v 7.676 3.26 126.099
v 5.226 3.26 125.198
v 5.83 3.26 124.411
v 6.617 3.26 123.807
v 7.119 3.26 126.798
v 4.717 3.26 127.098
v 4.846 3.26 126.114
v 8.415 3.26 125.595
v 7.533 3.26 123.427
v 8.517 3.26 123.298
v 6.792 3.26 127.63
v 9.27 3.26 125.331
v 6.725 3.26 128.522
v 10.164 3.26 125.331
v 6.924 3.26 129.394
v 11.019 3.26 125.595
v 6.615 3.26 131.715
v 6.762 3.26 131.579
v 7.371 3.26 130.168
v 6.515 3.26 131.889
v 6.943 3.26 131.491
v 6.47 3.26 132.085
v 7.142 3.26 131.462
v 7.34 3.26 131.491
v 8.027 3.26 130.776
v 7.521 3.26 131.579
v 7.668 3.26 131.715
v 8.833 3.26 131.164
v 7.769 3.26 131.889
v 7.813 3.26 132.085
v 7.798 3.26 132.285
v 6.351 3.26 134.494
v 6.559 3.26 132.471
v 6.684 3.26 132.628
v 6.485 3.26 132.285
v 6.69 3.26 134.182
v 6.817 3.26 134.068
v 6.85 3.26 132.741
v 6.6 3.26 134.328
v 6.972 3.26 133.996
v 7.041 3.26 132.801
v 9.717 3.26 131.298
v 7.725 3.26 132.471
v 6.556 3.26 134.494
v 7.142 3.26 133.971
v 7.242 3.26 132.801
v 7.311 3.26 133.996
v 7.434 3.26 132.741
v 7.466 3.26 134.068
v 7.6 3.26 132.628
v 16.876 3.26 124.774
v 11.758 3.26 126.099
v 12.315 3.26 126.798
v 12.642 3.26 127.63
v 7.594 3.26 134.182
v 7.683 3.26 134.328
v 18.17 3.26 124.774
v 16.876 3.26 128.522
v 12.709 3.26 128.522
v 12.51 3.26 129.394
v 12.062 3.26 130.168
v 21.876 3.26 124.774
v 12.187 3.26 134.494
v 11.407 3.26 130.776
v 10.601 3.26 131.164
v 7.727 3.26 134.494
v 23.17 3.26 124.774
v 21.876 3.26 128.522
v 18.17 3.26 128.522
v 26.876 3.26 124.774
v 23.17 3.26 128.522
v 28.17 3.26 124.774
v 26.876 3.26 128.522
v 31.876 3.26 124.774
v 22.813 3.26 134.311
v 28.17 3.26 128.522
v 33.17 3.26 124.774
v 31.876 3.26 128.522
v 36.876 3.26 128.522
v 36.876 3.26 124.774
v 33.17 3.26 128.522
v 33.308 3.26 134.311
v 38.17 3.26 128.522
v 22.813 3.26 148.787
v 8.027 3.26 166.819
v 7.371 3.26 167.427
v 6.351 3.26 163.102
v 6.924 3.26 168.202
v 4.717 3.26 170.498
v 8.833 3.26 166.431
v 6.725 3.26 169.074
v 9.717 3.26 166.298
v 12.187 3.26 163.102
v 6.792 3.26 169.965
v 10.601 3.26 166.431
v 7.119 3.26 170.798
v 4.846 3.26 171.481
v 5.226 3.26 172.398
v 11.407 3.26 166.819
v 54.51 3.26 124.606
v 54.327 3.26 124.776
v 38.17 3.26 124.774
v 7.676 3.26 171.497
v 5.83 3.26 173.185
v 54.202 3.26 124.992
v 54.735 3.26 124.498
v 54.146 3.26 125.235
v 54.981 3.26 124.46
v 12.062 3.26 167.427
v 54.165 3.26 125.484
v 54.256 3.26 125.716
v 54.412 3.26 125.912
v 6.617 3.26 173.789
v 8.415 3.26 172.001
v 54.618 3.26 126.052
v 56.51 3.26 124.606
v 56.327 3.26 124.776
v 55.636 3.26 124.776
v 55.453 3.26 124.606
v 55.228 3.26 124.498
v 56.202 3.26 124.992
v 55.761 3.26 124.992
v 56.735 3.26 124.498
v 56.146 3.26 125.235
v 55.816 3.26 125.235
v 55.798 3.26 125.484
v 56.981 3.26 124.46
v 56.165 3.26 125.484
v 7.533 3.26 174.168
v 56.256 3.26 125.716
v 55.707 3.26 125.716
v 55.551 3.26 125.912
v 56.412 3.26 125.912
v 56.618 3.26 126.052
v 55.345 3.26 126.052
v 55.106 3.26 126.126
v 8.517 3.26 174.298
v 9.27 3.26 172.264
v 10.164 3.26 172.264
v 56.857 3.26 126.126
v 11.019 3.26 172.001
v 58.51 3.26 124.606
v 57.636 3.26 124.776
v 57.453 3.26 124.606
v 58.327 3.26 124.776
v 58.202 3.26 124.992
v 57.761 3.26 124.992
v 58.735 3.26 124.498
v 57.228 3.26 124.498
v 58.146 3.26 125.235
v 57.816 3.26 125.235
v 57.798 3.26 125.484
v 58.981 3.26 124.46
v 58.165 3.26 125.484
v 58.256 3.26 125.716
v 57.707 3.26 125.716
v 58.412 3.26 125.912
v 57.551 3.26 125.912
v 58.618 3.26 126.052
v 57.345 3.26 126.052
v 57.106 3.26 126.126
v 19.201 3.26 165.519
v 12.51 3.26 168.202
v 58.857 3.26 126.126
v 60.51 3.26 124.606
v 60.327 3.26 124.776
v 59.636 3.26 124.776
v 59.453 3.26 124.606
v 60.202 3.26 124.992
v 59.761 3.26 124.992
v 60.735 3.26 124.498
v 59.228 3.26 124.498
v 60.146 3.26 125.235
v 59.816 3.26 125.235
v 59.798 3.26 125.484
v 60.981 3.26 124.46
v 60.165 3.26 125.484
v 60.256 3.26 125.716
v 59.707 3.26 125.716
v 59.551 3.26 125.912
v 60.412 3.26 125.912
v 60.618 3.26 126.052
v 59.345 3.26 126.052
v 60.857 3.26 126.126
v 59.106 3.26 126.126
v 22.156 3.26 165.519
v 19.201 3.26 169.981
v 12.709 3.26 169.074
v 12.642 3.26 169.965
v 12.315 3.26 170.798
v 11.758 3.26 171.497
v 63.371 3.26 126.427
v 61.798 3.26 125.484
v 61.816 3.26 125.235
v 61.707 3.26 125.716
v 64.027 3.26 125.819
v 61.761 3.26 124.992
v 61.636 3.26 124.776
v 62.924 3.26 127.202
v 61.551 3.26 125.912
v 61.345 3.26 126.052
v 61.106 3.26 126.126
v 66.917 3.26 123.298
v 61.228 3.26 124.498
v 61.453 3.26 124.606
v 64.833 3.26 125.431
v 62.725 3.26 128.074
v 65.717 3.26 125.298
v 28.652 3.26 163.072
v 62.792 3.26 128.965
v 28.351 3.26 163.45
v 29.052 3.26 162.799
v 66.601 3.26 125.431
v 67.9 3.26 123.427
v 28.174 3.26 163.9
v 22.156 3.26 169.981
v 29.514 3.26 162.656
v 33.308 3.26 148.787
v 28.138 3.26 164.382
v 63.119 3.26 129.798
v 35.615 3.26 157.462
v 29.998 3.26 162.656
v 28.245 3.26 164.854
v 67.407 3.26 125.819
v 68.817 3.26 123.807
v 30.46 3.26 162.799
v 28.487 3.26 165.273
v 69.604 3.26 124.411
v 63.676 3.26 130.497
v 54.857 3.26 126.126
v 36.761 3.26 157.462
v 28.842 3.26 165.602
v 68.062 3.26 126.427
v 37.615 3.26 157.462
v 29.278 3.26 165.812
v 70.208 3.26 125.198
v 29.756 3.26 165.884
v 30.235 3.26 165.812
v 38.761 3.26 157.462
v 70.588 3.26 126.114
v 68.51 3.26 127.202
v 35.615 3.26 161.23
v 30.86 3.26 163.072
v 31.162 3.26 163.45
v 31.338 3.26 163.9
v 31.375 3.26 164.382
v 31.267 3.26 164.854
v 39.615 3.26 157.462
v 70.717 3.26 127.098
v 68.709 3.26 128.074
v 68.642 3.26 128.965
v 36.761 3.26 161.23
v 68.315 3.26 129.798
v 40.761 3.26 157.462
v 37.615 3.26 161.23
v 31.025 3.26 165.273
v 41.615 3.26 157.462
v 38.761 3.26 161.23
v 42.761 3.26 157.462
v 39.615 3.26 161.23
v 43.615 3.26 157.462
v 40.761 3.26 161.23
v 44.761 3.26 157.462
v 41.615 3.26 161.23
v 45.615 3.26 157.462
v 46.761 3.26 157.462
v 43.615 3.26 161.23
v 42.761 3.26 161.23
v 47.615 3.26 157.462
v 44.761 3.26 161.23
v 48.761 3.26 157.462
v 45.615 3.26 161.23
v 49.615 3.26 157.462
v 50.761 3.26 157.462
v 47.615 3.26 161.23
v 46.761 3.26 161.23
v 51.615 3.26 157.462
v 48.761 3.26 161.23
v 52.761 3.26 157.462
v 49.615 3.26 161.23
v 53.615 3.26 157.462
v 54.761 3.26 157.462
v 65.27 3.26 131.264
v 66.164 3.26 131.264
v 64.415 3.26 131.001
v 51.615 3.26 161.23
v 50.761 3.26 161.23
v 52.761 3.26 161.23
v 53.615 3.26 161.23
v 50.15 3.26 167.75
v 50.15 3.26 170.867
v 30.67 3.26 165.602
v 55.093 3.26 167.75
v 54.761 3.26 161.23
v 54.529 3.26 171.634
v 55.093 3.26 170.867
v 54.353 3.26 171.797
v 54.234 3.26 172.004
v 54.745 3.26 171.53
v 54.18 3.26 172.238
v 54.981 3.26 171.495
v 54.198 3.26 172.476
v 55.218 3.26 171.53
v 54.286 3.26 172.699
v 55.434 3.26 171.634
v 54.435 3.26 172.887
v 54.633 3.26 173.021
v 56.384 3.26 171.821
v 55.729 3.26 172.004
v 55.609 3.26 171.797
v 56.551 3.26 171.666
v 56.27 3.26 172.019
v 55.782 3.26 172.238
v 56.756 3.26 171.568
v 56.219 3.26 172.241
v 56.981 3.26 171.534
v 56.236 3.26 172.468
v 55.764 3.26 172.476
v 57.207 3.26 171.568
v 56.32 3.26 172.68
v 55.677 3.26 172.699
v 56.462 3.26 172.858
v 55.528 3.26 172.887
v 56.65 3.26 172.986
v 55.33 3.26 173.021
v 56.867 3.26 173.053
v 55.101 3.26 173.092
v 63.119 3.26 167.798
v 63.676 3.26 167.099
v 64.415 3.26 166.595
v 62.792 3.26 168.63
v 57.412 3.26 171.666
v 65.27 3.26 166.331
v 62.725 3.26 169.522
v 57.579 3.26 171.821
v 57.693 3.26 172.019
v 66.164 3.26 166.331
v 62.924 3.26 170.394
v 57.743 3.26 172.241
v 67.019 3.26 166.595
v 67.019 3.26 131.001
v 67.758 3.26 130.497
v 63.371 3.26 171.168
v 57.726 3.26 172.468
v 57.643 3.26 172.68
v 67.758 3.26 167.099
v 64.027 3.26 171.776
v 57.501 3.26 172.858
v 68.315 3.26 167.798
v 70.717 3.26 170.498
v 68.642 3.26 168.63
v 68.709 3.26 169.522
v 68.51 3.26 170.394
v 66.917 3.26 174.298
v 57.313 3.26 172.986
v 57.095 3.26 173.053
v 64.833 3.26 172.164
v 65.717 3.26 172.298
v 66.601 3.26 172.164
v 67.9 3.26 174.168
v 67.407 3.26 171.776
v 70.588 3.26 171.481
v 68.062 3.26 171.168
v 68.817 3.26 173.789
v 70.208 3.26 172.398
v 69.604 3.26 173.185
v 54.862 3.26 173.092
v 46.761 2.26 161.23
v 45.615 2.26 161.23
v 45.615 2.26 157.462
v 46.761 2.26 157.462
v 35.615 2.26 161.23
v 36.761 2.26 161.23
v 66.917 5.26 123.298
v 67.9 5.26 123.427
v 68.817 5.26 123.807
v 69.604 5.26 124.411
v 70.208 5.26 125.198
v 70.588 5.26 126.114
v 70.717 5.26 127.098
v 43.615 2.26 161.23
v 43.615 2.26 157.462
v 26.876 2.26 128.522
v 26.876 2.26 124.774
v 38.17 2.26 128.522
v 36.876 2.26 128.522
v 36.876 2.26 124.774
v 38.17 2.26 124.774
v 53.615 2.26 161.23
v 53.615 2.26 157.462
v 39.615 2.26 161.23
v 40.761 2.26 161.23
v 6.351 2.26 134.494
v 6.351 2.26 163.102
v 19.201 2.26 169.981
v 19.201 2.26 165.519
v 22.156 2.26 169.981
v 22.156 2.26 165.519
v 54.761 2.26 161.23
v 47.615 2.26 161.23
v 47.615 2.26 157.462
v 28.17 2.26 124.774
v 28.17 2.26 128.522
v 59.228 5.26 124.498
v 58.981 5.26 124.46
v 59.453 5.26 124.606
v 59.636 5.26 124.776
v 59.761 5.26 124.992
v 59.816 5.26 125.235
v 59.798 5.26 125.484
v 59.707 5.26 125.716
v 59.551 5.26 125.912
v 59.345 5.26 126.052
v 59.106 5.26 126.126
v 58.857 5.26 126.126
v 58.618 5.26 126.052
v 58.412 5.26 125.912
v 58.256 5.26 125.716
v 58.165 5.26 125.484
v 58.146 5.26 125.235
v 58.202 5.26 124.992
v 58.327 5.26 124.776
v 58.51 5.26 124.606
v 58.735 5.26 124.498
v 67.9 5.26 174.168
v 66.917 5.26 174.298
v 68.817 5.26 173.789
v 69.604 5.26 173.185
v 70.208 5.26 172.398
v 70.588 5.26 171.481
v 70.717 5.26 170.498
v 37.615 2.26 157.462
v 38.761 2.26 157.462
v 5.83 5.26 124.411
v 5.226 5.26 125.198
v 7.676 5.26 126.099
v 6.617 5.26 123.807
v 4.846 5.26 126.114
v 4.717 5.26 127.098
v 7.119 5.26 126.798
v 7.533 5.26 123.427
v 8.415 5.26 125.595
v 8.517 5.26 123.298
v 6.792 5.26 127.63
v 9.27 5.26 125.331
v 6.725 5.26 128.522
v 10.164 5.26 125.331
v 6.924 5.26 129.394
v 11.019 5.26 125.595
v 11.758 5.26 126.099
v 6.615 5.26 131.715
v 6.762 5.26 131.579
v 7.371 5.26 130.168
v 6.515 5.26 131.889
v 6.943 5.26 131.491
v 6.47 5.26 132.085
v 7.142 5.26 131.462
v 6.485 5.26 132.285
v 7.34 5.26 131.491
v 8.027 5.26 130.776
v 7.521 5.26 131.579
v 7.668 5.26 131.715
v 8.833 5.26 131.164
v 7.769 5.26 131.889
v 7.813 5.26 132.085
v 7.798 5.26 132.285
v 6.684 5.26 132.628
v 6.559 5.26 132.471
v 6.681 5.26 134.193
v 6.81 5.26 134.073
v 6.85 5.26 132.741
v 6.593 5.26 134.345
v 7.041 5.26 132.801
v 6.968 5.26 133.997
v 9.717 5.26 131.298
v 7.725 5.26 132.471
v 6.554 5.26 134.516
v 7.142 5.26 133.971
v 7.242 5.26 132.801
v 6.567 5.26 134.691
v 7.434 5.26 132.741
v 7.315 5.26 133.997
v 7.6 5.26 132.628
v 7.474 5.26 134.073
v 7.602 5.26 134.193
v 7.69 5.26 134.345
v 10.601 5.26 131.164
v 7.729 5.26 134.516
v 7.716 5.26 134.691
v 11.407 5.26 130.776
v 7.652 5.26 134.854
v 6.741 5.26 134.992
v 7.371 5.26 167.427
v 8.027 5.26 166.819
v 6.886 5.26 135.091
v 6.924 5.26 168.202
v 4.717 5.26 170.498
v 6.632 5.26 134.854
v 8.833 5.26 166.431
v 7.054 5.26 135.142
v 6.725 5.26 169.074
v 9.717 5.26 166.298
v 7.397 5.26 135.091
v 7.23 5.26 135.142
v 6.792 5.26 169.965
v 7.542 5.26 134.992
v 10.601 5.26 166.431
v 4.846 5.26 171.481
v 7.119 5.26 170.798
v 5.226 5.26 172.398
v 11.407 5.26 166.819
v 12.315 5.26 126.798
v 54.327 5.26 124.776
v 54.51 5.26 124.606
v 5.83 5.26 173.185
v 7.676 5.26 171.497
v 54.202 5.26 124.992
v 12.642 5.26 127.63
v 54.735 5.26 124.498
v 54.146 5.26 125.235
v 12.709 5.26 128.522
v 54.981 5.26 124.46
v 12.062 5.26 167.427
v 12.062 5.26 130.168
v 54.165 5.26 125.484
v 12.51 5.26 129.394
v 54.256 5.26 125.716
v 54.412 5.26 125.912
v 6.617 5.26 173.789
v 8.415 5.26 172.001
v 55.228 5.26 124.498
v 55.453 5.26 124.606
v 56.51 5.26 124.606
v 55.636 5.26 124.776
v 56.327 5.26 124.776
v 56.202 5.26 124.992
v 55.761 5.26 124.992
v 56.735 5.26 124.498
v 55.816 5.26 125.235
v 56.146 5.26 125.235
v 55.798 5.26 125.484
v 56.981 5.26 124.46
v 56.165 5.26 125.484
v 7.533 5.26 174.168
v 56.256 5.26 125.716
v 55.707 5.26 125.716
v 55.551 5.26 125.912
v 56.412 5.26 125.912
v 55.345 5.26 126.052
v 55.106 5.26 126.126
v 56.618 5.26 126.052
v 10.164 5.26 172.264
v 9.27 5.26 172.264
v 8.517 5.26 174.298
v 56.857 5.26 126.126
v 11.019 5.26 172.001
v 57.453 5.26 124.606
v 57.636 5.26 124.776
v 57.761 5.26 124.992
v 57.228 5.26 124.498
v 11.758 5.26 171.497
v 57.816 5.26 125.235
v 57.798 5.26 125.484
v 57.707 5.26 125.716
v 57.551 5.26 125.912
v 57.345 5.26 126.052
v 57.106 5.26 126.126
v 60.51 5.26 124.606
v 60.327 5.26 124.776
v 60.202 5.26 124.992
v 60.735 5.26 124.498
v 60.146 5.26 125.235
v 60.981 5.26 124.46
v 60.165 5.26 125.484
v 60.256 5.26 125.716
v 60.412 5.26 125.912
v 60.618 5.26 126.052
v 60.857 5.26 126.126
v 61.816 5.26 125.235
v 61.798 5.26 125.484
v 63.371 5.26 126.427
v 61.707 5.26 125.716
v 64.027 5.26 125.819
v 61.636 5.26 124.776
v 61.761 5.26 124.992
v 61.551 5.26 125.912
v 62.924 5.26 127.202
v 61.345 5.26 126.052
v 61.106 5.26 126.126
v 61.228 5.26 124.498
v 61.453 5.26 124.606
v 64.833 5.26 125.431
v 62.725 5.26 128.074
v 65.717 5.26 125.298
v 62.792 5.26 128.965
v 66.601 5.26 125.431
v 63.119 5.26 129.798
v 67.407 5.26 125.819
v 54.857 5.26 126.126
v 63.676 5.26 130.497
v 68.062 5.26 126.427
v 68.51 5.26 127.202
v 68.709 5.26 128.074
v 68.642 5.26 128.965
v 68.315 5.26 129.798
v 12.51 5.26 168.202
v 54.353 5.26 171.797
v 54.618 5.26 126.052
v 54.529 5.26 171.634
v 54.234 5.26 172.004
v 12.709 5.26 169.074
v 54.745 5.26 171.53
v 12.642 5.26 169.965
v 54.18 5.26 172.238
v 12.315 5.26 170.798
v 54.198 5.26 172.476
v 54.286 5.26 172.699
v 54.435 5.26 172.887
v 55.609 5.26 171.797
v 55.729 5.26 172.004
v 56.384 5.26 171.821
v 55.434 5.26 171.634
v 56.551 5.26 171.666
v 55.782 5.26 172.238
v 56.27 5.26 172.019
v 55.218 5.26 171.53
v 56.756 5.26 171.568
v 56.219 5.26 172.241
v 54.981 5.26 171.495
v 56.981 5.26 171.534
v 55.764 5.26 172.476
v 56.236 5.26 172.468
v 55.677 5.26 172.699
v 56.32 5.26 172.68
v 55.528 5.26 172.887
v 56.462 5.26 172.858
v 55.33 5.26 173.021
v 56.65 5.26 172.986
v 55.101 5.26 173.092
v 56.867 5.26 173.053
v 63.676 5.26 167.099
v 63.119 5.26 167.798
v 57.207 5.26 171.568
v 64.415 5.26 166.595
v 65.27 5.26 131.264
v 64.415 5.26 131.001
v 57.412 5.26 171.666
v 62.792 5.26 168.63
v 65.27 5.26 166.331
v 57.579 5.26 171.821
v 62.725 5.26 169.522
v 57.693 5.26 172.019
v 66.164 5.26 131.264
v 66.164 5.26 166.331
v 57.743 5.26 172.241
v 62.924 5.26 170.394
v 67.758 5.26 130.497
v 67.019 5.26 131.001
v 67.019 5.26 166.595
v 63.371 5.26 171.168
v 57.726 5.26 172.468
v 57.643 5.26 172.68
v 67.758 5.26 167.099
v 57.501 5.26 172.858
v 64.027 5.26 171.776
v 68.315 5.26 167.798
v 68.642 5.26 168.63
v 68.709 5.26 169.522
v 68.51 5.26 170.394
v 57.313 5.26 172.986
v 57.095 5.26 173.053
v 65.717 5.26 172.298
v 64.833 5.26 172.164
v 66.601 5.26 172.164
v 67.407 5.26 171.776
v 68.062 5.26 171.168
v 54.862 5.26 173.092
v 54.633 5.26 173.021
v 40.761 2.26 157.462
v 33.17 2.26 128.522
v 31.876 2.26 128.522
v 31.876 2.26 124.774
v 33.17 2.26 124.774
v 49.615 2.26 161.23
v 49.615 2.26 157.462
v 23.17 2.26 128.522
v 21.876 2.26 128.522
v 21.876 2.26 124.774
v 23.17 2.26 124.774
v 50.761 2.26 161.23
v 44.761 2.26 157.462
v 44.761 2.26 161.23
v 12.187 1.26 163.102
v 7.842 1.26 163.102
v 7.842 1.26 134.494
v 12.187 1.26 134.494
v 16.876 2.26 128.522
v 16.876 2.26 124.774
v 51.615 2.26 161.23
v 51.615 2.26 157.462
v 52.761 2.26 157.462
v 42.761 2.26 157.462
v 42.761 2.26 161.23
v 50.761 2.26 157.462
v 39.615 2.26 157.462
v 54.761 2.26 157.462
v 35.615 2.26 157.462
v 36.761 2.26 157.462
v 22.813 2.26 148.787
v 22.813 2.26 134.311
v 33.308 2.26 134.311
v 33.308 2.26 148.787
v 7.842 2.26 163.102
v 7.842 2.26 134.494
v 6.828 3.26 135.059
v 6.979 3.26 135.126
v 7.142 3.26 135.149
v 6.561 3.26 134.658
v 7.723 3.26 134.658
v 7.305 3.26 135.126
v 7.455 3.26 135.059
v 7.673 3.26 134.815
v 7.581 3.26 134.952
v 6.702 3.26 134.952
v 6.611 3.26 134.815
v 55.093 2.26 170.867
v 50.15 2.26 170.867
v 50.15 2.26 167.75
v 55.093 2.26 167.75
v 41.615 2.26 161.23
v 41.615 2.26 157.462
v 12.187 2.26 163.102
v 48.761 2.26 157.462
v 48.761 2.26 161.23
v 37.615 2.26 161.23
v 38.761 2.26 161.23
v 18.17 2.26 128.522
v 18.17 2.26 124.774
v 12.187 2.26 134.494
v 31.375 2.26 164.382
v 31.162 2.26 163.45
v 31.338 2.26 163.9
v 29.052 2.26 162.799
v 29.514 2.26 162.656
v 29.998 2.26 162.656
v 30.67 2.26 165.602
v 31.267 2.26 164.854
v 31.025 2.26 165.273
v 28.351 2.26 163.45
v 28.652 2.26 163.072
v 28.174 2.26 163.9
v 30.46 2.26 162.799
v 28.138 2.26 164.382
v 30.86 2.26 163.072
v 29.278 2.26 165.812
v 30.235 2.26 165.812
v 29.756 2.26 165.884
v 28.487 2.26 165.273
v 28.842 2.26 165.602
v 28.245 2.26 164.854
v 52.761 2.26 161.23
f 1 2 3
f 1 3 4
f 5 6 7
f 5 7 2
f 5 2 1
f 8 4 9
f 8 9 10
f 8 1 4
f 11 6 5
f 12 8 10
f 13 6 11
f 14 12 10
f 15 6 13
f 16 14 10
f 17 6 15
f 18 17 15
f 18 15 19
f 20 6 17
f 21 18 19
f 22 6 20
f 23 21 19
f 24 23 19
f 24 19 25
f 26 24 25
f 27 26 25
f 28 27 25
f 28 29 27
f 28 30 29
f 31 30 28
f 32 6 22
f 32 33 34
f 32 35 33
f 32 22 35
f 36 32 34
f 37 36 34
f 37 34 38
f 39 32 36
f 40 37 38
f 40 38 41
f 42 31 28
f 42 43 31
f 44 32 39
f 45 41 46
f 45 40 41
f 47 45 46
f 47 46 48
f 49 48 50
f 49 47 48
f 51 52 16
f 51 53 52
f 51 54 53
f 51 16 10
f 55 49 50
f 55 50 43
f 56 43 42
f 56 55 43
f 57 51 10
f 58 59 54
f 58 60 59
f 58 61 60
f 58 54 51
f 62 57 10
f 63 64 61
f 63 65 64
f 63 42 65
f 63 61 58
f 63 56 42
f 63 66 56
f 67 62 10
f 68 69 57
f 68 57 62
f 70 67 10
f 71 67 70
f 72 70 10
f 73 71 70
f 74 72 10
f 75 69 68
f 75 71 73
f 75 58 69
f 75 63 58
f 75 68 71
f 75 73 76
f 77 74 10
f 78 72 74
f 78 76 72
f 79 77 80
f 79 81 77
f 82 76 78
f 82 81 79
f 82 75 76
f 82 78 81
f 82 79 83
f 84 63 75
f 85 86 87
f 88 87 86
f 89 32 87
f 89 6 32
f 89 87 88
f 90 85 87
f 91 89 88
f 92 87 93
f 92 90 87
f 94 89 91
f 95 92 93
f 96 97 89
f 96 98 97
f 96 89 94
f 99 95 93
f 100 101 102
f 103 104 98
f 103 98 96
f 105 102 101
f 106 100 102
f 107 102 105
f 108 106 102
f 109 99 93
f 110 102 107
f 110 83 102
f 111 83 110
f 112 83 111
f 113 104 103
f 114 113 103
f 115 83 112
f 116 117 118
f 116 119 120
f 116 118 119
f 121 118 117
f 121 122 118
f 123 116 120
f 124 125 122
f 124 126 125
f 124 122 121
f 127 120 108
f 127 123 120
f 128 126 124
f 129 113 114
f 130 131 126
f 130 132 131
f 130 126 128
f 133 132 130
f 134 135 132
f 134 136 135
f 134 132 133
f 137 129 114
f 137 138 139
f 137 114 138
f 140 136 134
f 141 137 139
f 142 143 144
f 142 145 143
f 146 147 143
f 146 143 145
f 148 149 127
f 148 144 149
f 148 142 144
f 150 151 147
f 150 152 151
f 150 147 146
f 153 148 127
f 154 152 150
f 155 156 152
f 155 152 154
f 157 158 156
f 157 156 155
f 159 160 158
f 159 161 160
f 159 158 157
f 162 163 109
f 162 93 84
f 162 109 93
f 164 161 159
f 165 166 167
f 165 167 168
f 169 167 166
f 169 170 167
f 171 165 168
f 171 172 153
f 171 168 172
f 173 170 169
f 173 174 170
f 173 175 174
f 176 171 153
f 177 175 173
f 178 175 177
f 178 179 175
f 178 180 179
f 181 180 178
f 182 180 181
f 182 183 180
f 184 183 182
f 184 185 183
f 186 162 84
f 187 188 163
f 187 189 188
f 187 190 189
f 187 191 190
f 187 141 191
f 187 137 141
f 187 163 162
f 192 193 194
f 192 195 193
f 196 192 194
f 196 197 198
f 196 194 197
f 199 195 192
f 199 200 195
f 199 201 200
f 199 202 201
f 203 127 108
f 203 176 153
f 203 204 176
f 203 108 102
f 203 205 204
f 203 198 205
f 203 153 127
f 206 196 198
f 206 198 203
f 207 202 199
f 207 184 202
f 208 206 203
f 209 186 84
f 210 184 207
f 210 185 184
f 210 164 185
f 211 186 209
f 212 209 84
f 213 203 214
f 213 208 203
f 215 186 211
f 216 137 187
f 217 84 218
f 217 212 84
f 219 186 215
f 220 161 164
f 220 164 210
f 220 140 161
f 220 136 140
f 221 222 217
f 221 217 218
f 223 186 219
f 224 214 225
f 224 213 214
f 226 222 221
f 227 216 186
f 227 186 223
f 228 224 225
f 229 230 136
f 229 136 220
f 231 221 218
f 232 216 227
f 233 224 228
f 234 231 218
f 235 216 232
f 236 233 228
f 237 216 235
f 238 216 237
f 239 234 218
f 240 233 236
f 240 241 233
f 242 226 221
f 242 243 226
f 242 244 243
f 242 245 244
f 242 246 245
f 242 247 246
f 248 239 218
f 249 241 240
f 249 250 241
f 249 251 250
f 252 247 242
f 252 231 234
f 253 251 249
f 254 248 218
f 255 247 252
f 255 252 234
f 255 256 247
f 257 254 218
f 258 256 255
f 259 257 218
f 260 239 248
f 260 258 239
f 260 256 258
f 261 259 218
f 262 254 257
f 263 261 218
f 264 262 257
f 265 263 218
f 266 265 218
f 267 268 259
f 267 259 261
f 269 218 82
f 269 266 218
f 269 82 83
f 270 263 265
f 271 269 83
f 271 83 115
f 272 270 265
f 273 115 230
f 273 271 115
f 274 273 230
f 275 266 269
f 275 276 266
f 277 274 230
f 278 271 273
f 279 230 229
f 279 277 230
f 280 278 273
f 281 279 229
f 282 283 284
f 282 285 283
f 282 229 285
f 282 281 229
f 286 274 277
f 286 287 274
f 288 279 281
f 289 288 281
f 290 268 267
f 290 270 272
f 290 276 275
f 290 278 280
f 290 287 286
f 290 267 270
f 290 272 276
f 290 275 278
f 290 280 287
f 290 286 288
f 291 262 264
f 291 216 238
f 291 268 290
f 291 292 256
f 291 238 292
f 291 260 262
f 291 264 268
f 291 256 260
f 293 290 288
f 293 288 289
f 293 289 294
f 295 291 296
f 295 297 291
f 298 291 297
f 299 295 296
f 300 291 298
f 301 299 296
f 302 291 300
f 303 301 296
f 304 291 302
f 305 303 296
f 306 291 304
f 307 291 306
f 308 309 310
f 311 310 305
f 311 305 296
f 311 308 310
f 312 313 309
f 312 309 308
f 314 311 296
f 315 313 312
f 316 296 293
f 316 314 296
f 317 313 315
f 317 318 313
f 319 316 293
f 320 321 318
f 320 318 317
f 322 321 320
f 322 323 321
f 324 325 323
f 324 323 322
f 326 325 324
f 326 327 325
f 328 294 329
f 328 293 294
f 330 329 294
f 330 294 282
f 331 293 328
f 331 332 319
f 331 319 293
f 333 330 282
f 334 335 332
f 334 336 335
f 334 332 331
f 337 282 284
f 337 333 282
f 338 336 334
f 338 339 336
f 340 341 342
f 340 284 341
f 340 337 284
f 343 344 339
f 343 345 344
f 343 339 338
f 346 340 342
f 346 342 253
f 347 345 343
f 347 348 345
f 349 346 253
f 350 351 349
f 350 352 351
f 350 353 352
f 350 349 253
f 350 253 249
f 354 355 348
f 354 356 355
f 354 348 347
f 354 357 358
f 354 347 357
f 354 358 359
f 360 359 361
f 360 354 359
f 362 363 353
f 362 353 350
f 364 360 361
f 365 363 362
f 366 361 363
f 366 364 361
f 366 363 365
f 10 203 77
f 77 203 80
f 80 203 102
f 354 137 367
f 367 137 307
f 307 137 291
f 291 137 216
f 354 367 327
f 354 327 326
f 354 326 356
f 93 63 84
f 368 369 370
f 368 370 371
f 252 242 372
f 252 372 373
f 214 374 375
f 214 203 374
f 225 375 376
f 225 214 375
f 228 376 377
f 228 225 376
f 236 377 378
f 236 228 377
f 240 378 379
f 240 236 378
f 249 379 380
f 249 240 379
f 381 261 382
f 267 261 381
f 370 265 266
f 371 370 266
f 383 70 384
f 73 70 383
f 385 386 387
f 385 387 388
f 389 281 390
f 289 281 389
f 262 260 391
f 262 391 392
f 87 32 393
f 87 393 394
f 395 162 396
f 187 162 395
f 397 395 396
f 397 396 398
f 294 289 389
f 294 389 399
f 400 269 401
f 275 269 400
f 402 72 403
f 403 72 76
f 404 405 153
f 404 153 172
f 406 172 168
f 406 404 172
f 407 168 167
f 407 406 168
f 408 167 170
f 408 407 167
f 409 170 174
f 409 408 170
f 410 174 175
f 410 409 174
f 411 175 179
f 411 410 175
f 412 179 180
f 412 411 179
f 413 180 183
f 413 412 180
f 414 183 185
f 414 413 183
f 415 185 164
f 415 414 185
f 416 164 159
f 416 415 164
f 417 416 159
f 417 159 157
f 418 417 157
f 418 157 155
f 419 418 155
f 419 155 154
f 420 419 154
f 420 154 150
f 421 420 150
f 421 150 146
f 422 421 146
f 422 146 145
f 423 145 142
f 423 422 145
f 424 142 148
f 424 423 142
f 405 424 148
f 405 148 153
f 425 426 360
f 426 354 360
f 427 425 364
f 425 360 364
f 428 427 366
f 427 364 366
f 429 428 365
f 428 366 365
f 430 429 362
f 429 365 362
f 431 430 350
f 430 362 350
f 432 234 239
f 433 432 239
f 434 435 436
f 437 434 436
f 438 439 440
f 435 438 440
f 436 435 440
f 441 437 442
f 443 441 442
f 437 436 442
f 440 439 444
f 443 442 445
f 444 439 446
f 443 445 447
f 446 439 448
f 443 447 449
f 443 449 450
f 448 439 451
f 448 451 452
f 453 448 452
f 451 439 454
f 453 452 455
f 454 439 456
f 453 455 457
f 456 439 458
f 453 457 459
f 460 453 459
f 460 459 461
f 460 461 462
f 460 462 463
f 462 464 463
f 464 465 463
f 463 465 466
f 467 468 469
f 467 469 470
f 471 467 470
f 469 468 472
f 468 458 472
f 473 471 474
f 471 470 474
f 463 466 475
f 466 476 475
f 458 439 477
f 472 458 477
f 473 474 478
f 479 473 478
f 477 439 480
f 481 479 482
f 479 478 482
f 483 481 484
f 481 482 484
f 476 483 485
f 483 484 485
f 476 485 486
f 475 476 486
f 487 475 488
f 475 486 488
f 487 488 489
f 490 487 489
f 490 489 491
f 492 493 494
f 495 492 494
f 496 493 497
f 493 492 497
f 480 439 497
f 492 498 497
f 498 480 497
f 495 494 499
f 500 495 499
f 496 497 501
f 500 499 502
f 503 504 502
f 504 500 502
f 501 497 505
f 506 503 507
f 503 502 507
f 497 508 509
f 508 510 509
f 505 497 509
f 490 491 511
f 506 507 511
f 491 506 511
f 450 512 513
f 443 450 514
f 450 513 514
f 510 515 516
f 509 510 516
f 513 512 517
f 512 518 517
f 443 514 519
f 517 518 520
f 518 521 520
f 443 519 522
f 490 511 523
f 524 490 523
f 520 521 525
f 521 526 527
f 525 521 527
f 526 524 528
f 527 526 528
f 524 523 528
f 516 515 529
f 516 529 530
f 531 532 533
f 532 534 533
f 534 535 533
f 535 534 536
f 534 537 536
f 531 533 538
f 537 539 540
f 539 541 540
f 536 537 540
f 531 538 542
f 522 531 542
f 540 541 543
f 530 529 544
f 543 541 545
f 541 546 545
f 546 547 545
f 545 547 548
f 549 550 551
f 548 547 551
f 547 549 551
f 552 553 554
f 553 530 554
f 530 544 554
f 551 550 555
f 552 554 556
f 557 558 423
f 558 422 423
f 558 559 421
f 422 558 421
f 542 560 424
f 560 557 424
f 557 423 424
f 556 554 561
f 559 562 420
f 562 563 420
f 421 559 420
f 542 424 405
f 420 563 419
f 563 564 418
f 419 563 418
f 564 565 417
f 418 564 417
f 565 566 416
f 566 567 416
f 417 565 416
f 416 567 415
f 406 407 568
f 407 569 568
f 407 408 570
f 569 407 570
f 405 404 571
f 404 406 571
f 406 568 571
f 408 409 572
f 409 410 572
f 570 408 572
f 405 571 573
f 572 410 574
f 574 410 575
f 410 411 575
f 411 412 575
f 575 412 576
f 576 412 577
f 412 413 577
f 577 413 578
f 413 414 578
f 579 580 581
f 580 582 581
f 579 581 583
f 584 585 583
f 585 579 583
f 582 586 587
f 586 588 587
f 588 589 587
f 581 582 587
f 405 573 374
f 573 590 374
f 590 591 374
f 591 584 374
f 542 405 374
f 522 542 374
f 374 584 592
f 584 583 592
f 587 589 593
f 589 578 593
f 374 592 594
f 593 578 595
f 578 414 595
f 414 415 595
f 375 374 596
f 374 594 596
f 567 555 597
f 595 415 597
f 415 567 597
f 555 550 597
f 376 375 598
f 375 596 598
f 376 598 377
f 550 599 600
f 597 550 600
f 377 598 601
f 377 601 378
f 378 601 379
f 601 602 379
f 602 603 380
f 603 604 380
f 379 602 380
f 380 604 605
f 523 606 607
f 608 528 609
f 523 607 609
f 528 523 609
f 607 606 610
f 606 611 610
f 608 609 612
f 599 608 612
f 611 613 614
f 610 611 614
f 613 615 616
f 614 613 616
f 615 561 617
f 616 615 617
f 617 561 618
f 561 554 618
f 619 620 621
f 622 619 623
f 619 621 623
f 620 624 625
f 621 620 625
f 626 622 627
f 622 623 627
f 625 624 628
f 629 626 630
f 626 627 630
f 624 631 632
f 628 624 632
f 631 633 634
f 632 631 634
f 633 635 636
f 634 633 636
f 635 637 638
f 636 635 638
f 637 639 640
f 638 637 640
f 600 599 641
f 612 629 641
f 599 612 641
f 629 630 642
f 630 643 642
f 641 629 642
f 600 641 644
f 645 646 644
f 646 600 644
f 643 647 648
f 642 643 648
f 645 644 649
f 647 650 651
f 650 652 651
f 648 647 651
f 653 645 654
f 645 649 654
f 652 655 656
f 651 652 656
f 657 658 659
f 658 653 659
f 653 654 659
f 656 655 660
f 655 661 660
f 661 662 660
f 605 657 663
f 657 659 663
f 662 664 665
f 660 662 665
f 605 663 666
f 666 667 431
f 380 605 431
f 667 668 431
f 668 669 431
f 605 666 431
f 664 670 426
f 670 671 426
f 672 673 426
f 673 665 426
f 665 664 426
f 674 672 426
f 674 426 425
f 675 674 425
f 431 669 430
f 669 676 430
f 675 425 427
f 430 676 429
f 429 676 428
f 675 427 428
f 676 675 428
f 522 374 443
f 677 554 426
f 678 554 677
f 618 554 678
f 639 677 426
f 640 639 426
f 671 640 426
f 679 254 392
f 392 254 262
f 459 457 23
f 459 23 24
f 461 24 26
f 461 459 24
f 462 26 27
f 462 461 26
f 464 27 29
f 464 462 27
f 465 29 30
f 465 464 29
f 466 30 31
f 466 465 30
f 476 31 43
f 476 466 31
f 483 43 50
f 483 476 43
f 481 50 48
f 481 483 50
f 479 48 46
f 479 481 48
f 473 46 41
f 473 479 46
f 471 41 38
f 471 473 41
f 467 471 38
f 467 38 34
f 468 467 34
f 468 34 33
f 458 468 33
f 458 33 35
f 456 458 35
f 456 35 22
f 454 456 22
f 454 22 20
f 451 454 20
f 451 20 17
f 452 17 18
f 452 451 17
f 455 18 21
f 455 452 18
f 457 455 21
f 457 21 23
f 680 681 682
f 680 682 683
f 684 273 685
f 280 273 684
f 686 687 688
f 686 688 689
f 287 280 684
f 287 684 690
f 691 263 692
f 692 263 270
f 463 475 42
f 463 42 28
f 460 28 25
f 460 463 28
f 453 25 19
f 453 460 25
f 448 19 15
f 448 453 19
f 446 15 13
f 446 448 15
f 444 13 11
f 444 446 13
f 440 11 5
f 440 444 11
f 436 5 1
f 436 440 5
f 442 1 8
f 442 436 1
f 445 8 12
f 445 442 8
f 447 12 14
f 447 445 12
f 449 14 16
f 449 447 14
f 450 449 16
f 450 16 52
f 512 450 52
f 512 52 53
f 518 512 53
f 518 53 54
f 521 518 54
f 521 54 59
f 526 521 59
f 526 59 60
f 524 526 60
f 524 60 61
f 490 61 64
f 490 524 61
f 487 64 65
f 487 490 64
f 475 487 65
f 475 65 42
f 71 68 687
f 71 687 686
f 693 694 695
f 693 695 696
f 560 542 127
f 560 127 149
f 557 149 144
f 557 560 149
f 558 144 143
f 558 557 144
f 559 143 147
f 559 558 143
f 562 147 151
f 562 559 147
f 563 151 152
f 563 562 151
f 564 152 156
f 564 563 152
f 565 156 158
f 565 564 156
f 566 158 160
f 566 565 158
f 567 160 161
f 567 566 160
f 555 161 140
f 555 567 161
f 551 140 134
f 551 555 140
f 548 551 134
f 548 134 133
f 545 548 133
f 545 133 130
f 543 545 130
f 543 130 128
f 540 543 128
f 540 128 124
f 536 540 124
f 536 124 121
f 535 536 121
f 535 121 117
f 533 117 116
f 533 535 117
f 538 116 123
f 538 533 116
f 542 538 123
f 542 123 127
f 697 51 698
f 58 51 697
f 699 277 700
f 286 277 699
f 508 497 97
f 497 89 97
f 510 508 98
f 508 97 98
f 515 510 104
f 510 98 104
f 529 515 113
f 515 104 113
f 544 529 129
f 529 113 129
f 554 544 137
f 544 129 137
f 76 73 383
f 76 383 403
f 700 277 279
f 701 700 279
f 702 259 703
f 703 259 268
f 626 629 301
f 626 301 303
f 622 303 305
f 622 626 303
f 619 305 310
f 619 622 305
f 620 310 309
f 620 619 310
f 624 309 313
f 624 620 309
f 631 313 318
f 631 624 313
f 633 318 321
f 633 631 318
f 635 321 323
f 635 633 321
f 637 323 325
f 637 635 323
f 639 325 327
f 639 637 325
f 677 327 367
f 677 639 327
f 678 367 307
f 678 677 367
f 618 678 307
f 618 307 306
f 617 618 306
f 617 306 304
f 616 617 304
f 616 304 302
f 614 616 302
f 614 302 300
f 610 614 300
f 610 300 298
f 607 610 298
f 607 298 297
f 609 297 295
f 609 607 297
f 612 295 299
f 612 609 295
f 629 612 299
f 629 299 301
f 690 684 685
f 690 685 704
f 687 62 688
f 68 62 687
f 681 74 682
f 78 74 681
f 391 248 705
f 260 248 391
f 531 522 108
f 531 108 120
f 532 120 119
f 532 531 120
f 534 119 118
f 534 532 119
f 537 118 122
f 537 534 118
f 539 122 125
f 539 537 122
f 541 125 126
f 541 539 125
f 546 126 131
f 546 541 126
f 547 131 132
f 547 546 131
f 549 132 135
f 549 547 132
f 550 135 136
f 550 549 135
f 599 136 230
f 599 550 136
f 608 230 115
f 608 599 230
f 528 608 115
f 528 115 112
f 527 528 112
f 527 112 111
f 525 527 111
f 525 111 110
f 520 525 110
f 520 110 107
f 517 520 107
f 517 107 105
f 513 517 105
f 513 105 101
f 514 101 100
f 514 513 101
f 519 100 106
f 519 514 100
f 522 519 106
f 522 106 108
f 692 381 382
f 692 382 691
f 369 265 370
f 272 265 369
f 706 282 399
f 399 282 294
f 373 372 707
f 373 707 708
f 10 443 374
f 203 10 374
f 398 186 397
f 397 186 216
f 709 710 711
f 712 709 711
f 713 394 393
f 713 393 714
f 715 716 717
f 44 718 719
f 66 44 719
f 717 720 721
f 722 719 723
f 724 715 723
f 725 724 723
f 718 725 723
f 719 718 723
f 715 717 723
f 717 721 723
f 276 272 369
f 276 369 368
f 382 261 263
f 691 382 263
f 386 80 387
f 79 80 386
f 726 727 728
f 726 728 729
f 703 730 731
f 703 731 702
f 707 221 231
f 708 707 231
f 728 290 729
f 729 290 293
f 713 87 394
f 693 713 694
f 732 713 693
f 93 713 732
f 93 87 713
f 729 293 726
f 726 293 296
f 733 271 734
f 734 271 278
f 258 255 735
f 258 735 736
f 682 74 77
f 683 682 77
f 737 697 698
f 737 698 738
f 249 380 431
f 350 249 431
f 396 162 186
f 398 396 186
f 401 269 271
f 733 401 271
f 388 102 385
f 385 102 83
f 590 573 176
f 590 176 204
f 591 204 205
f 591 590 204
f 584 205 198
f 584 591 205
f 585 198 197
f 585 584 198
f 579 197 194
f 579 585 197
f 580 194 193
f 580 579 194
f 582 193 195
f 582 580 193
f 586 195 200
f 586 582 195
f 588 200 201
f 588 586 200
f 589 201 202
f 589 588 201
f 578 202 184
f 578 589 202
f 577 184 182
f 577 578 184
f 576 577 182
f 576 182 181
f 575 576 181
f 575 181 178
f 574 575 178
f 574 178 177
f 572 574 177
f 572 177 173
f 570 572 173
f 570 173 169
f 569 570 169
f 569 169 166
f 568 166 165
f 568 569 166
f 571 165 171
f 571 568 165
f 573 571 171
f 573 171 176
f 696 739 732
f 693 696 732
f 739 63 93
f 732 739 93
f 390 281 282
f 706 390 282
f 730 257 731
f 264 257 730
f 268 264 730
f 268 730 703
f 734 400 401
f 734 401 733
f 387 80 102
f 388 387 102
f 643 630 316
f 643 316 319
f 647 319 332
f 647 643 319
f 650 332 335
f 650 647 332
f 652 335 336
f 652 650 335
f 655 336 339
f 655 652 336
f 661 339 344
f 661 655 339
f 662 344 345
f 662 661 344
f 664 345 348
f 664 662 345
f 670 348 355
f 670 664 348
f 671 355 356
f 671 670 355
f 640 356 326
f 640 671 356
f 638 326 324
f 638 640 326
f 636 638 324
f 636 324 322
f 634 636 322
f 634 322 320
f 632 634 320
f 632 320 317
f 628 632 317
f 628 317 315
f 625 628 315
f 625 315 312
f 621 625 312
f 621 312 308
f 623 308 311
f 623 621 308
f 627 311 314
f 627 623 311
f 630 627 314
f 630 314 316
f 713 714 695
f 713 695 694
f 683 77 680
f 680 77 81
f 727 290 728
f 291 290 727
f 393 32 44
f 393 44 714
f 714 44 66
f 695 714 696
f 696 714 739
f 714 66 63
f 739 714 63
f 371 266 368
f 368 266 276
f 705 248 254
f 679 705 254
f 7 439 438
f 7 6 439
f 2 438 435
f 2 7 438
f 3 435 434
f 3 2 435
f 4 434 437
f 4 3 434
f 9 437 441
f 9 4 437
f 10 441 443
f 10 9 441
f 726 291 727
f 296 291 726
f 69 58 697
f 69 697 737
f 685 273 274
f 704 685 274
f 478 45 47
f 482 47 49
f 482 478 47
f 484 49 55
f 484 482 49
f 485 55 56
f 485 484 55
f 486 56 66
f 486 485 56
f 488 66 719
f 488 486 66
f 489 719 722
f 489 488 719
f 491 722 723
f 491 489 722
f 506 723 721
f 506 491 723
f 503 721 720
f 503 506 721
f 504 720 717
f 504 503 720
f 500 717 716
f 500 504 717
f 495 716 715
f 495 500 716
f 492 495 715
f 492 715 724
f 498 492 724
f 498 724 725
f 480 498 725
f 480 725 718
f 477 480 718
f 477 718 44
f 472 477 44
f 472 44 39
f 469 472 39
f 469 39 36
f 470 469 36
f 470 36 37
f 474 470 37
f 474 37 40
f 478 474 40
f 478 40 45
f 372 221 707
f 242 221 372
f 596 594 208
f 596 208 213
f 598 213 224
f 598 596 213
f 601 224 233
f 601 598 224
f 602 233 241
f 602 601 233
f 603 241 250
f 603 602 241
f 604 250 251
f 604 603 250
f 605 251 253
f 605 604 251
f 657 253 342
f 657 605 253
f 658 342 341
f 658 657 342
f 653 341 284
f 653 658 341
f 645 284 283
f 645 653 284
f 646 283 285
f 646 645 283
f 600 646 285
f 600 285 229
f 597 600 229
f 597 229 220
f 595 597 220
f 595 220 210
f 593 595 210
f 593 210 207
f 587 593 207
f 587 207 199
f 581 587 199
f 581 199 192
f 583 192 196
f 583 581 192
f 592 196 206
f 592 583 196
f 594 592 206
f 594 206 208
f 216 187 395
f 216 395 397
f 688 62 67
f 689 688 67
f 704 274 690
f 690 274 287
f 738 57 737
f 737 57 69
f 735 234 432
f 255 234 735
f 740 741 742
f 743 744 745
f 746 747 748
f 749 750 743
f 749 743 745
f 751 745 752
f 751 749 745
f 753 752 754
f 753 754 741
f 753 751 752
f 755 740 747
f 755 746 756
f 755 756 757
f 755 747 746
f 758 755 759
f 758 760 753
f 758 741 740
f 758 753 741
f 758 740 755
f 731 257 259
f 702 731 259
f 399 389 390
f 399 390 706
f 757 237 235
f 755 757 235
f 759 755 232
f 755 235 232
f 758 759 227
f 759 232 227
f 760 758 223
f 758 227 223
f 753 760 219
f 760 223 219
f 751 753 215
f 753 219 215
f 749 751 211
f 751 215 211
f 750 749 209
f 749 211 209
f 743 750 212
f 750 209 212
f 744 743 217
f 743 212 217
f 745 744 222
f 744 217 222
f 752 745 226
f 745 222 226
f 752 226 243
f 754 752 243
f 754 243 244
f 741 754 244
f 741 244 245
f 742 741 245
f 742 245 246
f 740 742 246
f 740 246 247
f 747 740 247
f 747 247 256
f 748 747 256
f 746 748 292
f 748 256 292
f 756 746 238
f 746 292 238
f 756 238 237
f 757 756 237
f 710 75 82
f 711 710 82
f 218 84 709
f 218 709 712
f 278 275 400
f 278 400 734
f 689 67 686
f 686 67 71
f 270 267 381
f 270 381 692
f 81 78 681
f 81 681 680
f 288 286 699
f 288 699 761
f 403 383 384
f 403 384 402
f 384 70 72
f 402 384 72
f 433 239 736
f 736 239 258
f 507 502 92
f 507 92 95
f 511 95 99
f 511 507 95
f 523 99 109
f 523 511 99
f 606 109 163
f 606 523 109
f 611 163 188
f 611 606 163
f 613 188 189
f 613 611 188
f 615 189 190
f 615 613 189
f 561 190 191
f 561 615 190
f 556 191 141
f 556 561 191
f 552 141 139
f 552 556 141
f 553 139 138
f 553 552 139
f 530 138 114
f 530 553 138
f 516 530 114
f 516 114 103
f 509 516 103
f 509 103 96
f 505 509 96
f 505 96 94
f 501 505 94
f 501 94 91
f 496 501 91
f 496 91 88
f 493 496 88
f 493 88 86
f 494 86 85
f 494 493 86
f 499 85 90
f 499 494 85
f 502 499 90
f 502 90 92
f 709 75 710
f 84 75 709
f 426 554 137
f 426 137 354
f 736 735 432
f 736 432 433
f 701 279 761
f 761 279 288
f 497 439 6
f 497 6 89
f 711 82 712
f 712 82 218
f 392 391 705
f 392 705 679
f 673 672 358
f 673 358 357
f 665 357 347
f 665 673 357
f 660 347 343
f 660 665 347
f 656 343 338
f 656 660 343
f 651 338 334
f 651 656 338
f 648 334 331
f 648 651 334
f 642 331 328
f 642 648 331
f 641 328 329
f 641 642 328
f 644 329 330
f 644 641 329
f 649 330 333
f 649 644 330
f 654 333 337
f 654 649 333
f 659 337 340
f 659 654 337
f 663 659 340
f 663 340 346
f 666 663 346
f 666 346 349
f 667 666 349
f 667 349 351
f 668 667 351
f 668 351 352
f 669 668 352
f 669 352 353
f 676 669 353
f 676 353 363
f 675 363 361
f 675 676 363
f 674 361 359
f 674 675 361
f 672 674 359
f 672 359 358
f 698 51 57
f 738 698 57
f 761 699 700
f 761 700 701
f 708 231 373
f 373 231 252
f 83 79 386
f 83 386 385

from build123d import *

# Parameters (mm, degrees)
SKETCH1_W           = 66
SKETCH1_H           = 51
SKETCH1_R           = 3
SKETCH1_R_2         = 0.837405072
SKETCH1_R_3         = 0.764054199
SKETCH1_R_4         = 0.803226567
SKETCH1_R_5         = 0.673310758
SKETCH1_R_6         = 0.589146913
BOSS_EXTRUDE1_DEPTH = 2
FILLET1_R           = 3.8
SKETCH2_W           = 5.836445367
SKETCH2_H           = 28.608084639
BOSS_EXTRUDE2_DEPTH = 1
SKETCH3_W           = 4.344585264
SKETCH3_H           = 28.608084639
BOSS_EXTRUDE3_DEPTH = 1
SKETCH4_R           = 1.622882134
SKETCH4_W           = 1.146541205
SKETCH4_H           = 3.7676464
SKETCH4_W_2         = 10.495224563
SKETCH4_H_2         = 14.476262407
SKETCH4_W_3         = 2.954262821
SKETCH4_H_3         = 4.462113597
SKETCH4_W_4         = 4.942556884
SKETCH4_H_4         = 3.116266577
SKETCH4_W_5         = 1.293345918
SKETCH4_H_5         = 3.748296022
BOSS_EXTRUDE4_DEPTH = 1


with BuildPart() as part:
    # Sketch1 → Boss-Extrude1 (new body)
    with BuildSketch(Plane.XZ.offset(-5.259536096)):
        with Locations((37.716985738, 148.797755553)):
            Rectangle(SKETCH1_W, SKETCH1_H)
        with Locations(Location((65.716985738, 128.297755553, 0), (0, 0, 270))):  # turned: the seam where the file's is
            Circle(SKETCH1_R, mode=Mode.SUBTRACT)
        with Locations(Location((9.716985738, 128.297755553, 0), (0, 0, 90))):  # turned: the seam where the file's is
            Circle(SKETCH1_R, mode=Mode.SUBTRACT)
        with Locations(Location((65.716985738, 169.297755553, 0), (0, 0, 90))):  # turned: the seam where the file's is
            Circle(SKETCH1_R, mode=Mode.SUBTRACT)
        with Locations(Location((9.716985738, 169.297755553, 0), (0, 0, 270))):  # turned: the seam where the file's is
            Circle(SKETCH1_R, mode=Mode.SUBTRACT)
        with Locations(Location((60.981346955, 125.297755553, 0), (0, 0, 270))):  # turned: the seam where the file's is
            Circle(SKETCH1_R_2, mode=Mode.SUBTRACT)
        with Locations(Location((58.981346955, 125.297755553, 0), (0, 0, 270))):  # turned: the seam where the file's is
            Circle(SKETCH1_R_2, mode=Mode.SUBTRACT)
        with Locations(Location((56.981346955, 125.297755553, 0), (0, 0, 270))):  # turned: the seam where the file's is
            Circle(SKETCH1_R_2, mode=Mode.SUBTRACT)
        with Locations(Location((54.981346955, 125.297755553, 0), (0, 0, 270))):  # turned: the seam where the file's is
            Circle(SKETCH1_R_2, mode=Mode.SUBTRACT)
        with Locations(Location((56.981346955, 172.297755553, 0), (0, 0, 270))):  # turned: the seam where the file's is
            Circle(SKETCH1_R_3, mode=Mode.SUBTRACT)
        with Locations(Location((54.981346955, 172.297755553, 0), (0, 0, 270))):  # turned: the seam where the file's is
            Circle(SKETCH1_R_4, mode=Mode.SUBTRACT)
        with Locations(Location((7.14174105, 132.13483961, 0), (0, 0, 270))):  # turned: the seam where the file's is
            Circle(SKETCH1_R_5, mode=Mode.SUBTRACT)
        with Locations(Location((7.14174105, 134.559866184, 0), (0, 0, 270))):  # turned: the seam where the file's is
            Circle(SKETCH1_R_6, mode=Mode.SUBTRACT)
    extrude(amount=BOSS_EXTRUDE1_DEPTH)

    # Fillet1
    fillet1_edges = [part.edges().sort_by_distance(p)[0] for p in [
        (70.716985738, 4.259536096, 123.297755553),
        (4.716985738, 4.259536096, 123.297755553),
        (4.716985738, 4.259536096, 174.297755553),
        (70.716985738, 4.259536096, 174.297755553),
    ]]
    fillet(fillet1_edges, radius=FILLET1_R)

    # Sketch2 → Boss-Extrude2 (add)
    with BuildSketch(Plane.XZ.offset(-3.259536096)):
        with Locations((9.268800109, 148.797755553)):
            Rectangle(SKETCH2_W, SKETCH2_H)
    extrude(amount=BOSS_EXTRUDE2_DEPTH)

    # Sketch3 → Boss-Extrude3 (add)
    with BuildSketch(Plane.XZ.offset(-2.259536096)):
        with Locations((10.01473016, 148.797755553)):
            Rectangle(SKETCH3_W, SKETCH3_H)
    extrude(amount=BOSS_EXTRUDE3_DEPTH)

    # Sketch4 → Boss-Extrude4 (add)
    with BuildSketch(Plane.XZ.offset(-3.259536096)):
        with Locations(Location((29.756180169, 164.261204908, 0), (0, 0, 90))):  # turned: the seam where the file's is
            Circle(SKETCH4_R)
        with Locations((52.18819816, 159.346174618)):
            Rectangle(SKETCH4_W, SKETCH4_H)
        with Locations((28.060742514, 141.548791384)):
            Rectangle(SKETCH4_W_2, SKETCH4_H_2)
        with Locations((20.678530081, 167.750382062)):
            Rectangle(SKETCH4_W_3, SKETCH4_H_3)
        with Locations((52.621525564, 169.30851535)):
            Rectangle(SKETCH4_W_4, SKETCH4_H_4)
        with Locations((54.18819816, 159.346174618)):
            Rectangle(SKETCH4_W, SKETCH4_H)
        with Locations((50.18819816, 159.346174618)):
            Rectangle(SKETCH4_W, SKETCH4_H)
        with Locations((48.18819816, 159.346174618)):
            Rectangle(SKETCH4_W, SKETCH4_H)
        with Locations((46.18819816, 159.346174618)):
            Rectangle(SKETCH4_W, SKETCH4_H)
        with Locations((44.18819816, 159.346174618)):
            Rectangle(SKETCH4_W, SKETCH4_H)
        with Locations((42.18819816, 159.346174618)):
            Rectangle(SKETCH4_W, SKETCH4_H)
        with Locations((40.18819816, 159.346174618)):
            Rectangle(SKETCH4_W, SKETCH4_H)
        with Locations((38.18819816, 159.346174618)):
            Rectangle(SKETCH4_W, SKETCH4_H)
        with Locations((36.18819816, 159.346174618)):
            Rectangle(SKETCH4_W, SKETCH4_H)
        with Locations((22.523111138, 126.647676881)):
            Rectangle(SKETCH4_W_5, SKETCH4_H_5)
        with Locations((17.523111138, 126.647676881)):
            Rectangle(SKETCH4_W_5, SKETCH4_H_5)
        with Locations((27.523111138, 126.647676881)):
            Rectangle(SKETCH4_W_5, SKETCH4_H_5)
        with Locations((32.523111138, 126.647676881)):
            Rectangle(SKETCH4_W_5, SKETCH4_H_5)
        with Locations((37.523111138, 126.647676881)):
            Rectangle(SKETCH4_W_5, SKETCH4_H_5)
    extrude(amount=BOSS_EXTRUDE4_DEPTH)


solid = part.part
